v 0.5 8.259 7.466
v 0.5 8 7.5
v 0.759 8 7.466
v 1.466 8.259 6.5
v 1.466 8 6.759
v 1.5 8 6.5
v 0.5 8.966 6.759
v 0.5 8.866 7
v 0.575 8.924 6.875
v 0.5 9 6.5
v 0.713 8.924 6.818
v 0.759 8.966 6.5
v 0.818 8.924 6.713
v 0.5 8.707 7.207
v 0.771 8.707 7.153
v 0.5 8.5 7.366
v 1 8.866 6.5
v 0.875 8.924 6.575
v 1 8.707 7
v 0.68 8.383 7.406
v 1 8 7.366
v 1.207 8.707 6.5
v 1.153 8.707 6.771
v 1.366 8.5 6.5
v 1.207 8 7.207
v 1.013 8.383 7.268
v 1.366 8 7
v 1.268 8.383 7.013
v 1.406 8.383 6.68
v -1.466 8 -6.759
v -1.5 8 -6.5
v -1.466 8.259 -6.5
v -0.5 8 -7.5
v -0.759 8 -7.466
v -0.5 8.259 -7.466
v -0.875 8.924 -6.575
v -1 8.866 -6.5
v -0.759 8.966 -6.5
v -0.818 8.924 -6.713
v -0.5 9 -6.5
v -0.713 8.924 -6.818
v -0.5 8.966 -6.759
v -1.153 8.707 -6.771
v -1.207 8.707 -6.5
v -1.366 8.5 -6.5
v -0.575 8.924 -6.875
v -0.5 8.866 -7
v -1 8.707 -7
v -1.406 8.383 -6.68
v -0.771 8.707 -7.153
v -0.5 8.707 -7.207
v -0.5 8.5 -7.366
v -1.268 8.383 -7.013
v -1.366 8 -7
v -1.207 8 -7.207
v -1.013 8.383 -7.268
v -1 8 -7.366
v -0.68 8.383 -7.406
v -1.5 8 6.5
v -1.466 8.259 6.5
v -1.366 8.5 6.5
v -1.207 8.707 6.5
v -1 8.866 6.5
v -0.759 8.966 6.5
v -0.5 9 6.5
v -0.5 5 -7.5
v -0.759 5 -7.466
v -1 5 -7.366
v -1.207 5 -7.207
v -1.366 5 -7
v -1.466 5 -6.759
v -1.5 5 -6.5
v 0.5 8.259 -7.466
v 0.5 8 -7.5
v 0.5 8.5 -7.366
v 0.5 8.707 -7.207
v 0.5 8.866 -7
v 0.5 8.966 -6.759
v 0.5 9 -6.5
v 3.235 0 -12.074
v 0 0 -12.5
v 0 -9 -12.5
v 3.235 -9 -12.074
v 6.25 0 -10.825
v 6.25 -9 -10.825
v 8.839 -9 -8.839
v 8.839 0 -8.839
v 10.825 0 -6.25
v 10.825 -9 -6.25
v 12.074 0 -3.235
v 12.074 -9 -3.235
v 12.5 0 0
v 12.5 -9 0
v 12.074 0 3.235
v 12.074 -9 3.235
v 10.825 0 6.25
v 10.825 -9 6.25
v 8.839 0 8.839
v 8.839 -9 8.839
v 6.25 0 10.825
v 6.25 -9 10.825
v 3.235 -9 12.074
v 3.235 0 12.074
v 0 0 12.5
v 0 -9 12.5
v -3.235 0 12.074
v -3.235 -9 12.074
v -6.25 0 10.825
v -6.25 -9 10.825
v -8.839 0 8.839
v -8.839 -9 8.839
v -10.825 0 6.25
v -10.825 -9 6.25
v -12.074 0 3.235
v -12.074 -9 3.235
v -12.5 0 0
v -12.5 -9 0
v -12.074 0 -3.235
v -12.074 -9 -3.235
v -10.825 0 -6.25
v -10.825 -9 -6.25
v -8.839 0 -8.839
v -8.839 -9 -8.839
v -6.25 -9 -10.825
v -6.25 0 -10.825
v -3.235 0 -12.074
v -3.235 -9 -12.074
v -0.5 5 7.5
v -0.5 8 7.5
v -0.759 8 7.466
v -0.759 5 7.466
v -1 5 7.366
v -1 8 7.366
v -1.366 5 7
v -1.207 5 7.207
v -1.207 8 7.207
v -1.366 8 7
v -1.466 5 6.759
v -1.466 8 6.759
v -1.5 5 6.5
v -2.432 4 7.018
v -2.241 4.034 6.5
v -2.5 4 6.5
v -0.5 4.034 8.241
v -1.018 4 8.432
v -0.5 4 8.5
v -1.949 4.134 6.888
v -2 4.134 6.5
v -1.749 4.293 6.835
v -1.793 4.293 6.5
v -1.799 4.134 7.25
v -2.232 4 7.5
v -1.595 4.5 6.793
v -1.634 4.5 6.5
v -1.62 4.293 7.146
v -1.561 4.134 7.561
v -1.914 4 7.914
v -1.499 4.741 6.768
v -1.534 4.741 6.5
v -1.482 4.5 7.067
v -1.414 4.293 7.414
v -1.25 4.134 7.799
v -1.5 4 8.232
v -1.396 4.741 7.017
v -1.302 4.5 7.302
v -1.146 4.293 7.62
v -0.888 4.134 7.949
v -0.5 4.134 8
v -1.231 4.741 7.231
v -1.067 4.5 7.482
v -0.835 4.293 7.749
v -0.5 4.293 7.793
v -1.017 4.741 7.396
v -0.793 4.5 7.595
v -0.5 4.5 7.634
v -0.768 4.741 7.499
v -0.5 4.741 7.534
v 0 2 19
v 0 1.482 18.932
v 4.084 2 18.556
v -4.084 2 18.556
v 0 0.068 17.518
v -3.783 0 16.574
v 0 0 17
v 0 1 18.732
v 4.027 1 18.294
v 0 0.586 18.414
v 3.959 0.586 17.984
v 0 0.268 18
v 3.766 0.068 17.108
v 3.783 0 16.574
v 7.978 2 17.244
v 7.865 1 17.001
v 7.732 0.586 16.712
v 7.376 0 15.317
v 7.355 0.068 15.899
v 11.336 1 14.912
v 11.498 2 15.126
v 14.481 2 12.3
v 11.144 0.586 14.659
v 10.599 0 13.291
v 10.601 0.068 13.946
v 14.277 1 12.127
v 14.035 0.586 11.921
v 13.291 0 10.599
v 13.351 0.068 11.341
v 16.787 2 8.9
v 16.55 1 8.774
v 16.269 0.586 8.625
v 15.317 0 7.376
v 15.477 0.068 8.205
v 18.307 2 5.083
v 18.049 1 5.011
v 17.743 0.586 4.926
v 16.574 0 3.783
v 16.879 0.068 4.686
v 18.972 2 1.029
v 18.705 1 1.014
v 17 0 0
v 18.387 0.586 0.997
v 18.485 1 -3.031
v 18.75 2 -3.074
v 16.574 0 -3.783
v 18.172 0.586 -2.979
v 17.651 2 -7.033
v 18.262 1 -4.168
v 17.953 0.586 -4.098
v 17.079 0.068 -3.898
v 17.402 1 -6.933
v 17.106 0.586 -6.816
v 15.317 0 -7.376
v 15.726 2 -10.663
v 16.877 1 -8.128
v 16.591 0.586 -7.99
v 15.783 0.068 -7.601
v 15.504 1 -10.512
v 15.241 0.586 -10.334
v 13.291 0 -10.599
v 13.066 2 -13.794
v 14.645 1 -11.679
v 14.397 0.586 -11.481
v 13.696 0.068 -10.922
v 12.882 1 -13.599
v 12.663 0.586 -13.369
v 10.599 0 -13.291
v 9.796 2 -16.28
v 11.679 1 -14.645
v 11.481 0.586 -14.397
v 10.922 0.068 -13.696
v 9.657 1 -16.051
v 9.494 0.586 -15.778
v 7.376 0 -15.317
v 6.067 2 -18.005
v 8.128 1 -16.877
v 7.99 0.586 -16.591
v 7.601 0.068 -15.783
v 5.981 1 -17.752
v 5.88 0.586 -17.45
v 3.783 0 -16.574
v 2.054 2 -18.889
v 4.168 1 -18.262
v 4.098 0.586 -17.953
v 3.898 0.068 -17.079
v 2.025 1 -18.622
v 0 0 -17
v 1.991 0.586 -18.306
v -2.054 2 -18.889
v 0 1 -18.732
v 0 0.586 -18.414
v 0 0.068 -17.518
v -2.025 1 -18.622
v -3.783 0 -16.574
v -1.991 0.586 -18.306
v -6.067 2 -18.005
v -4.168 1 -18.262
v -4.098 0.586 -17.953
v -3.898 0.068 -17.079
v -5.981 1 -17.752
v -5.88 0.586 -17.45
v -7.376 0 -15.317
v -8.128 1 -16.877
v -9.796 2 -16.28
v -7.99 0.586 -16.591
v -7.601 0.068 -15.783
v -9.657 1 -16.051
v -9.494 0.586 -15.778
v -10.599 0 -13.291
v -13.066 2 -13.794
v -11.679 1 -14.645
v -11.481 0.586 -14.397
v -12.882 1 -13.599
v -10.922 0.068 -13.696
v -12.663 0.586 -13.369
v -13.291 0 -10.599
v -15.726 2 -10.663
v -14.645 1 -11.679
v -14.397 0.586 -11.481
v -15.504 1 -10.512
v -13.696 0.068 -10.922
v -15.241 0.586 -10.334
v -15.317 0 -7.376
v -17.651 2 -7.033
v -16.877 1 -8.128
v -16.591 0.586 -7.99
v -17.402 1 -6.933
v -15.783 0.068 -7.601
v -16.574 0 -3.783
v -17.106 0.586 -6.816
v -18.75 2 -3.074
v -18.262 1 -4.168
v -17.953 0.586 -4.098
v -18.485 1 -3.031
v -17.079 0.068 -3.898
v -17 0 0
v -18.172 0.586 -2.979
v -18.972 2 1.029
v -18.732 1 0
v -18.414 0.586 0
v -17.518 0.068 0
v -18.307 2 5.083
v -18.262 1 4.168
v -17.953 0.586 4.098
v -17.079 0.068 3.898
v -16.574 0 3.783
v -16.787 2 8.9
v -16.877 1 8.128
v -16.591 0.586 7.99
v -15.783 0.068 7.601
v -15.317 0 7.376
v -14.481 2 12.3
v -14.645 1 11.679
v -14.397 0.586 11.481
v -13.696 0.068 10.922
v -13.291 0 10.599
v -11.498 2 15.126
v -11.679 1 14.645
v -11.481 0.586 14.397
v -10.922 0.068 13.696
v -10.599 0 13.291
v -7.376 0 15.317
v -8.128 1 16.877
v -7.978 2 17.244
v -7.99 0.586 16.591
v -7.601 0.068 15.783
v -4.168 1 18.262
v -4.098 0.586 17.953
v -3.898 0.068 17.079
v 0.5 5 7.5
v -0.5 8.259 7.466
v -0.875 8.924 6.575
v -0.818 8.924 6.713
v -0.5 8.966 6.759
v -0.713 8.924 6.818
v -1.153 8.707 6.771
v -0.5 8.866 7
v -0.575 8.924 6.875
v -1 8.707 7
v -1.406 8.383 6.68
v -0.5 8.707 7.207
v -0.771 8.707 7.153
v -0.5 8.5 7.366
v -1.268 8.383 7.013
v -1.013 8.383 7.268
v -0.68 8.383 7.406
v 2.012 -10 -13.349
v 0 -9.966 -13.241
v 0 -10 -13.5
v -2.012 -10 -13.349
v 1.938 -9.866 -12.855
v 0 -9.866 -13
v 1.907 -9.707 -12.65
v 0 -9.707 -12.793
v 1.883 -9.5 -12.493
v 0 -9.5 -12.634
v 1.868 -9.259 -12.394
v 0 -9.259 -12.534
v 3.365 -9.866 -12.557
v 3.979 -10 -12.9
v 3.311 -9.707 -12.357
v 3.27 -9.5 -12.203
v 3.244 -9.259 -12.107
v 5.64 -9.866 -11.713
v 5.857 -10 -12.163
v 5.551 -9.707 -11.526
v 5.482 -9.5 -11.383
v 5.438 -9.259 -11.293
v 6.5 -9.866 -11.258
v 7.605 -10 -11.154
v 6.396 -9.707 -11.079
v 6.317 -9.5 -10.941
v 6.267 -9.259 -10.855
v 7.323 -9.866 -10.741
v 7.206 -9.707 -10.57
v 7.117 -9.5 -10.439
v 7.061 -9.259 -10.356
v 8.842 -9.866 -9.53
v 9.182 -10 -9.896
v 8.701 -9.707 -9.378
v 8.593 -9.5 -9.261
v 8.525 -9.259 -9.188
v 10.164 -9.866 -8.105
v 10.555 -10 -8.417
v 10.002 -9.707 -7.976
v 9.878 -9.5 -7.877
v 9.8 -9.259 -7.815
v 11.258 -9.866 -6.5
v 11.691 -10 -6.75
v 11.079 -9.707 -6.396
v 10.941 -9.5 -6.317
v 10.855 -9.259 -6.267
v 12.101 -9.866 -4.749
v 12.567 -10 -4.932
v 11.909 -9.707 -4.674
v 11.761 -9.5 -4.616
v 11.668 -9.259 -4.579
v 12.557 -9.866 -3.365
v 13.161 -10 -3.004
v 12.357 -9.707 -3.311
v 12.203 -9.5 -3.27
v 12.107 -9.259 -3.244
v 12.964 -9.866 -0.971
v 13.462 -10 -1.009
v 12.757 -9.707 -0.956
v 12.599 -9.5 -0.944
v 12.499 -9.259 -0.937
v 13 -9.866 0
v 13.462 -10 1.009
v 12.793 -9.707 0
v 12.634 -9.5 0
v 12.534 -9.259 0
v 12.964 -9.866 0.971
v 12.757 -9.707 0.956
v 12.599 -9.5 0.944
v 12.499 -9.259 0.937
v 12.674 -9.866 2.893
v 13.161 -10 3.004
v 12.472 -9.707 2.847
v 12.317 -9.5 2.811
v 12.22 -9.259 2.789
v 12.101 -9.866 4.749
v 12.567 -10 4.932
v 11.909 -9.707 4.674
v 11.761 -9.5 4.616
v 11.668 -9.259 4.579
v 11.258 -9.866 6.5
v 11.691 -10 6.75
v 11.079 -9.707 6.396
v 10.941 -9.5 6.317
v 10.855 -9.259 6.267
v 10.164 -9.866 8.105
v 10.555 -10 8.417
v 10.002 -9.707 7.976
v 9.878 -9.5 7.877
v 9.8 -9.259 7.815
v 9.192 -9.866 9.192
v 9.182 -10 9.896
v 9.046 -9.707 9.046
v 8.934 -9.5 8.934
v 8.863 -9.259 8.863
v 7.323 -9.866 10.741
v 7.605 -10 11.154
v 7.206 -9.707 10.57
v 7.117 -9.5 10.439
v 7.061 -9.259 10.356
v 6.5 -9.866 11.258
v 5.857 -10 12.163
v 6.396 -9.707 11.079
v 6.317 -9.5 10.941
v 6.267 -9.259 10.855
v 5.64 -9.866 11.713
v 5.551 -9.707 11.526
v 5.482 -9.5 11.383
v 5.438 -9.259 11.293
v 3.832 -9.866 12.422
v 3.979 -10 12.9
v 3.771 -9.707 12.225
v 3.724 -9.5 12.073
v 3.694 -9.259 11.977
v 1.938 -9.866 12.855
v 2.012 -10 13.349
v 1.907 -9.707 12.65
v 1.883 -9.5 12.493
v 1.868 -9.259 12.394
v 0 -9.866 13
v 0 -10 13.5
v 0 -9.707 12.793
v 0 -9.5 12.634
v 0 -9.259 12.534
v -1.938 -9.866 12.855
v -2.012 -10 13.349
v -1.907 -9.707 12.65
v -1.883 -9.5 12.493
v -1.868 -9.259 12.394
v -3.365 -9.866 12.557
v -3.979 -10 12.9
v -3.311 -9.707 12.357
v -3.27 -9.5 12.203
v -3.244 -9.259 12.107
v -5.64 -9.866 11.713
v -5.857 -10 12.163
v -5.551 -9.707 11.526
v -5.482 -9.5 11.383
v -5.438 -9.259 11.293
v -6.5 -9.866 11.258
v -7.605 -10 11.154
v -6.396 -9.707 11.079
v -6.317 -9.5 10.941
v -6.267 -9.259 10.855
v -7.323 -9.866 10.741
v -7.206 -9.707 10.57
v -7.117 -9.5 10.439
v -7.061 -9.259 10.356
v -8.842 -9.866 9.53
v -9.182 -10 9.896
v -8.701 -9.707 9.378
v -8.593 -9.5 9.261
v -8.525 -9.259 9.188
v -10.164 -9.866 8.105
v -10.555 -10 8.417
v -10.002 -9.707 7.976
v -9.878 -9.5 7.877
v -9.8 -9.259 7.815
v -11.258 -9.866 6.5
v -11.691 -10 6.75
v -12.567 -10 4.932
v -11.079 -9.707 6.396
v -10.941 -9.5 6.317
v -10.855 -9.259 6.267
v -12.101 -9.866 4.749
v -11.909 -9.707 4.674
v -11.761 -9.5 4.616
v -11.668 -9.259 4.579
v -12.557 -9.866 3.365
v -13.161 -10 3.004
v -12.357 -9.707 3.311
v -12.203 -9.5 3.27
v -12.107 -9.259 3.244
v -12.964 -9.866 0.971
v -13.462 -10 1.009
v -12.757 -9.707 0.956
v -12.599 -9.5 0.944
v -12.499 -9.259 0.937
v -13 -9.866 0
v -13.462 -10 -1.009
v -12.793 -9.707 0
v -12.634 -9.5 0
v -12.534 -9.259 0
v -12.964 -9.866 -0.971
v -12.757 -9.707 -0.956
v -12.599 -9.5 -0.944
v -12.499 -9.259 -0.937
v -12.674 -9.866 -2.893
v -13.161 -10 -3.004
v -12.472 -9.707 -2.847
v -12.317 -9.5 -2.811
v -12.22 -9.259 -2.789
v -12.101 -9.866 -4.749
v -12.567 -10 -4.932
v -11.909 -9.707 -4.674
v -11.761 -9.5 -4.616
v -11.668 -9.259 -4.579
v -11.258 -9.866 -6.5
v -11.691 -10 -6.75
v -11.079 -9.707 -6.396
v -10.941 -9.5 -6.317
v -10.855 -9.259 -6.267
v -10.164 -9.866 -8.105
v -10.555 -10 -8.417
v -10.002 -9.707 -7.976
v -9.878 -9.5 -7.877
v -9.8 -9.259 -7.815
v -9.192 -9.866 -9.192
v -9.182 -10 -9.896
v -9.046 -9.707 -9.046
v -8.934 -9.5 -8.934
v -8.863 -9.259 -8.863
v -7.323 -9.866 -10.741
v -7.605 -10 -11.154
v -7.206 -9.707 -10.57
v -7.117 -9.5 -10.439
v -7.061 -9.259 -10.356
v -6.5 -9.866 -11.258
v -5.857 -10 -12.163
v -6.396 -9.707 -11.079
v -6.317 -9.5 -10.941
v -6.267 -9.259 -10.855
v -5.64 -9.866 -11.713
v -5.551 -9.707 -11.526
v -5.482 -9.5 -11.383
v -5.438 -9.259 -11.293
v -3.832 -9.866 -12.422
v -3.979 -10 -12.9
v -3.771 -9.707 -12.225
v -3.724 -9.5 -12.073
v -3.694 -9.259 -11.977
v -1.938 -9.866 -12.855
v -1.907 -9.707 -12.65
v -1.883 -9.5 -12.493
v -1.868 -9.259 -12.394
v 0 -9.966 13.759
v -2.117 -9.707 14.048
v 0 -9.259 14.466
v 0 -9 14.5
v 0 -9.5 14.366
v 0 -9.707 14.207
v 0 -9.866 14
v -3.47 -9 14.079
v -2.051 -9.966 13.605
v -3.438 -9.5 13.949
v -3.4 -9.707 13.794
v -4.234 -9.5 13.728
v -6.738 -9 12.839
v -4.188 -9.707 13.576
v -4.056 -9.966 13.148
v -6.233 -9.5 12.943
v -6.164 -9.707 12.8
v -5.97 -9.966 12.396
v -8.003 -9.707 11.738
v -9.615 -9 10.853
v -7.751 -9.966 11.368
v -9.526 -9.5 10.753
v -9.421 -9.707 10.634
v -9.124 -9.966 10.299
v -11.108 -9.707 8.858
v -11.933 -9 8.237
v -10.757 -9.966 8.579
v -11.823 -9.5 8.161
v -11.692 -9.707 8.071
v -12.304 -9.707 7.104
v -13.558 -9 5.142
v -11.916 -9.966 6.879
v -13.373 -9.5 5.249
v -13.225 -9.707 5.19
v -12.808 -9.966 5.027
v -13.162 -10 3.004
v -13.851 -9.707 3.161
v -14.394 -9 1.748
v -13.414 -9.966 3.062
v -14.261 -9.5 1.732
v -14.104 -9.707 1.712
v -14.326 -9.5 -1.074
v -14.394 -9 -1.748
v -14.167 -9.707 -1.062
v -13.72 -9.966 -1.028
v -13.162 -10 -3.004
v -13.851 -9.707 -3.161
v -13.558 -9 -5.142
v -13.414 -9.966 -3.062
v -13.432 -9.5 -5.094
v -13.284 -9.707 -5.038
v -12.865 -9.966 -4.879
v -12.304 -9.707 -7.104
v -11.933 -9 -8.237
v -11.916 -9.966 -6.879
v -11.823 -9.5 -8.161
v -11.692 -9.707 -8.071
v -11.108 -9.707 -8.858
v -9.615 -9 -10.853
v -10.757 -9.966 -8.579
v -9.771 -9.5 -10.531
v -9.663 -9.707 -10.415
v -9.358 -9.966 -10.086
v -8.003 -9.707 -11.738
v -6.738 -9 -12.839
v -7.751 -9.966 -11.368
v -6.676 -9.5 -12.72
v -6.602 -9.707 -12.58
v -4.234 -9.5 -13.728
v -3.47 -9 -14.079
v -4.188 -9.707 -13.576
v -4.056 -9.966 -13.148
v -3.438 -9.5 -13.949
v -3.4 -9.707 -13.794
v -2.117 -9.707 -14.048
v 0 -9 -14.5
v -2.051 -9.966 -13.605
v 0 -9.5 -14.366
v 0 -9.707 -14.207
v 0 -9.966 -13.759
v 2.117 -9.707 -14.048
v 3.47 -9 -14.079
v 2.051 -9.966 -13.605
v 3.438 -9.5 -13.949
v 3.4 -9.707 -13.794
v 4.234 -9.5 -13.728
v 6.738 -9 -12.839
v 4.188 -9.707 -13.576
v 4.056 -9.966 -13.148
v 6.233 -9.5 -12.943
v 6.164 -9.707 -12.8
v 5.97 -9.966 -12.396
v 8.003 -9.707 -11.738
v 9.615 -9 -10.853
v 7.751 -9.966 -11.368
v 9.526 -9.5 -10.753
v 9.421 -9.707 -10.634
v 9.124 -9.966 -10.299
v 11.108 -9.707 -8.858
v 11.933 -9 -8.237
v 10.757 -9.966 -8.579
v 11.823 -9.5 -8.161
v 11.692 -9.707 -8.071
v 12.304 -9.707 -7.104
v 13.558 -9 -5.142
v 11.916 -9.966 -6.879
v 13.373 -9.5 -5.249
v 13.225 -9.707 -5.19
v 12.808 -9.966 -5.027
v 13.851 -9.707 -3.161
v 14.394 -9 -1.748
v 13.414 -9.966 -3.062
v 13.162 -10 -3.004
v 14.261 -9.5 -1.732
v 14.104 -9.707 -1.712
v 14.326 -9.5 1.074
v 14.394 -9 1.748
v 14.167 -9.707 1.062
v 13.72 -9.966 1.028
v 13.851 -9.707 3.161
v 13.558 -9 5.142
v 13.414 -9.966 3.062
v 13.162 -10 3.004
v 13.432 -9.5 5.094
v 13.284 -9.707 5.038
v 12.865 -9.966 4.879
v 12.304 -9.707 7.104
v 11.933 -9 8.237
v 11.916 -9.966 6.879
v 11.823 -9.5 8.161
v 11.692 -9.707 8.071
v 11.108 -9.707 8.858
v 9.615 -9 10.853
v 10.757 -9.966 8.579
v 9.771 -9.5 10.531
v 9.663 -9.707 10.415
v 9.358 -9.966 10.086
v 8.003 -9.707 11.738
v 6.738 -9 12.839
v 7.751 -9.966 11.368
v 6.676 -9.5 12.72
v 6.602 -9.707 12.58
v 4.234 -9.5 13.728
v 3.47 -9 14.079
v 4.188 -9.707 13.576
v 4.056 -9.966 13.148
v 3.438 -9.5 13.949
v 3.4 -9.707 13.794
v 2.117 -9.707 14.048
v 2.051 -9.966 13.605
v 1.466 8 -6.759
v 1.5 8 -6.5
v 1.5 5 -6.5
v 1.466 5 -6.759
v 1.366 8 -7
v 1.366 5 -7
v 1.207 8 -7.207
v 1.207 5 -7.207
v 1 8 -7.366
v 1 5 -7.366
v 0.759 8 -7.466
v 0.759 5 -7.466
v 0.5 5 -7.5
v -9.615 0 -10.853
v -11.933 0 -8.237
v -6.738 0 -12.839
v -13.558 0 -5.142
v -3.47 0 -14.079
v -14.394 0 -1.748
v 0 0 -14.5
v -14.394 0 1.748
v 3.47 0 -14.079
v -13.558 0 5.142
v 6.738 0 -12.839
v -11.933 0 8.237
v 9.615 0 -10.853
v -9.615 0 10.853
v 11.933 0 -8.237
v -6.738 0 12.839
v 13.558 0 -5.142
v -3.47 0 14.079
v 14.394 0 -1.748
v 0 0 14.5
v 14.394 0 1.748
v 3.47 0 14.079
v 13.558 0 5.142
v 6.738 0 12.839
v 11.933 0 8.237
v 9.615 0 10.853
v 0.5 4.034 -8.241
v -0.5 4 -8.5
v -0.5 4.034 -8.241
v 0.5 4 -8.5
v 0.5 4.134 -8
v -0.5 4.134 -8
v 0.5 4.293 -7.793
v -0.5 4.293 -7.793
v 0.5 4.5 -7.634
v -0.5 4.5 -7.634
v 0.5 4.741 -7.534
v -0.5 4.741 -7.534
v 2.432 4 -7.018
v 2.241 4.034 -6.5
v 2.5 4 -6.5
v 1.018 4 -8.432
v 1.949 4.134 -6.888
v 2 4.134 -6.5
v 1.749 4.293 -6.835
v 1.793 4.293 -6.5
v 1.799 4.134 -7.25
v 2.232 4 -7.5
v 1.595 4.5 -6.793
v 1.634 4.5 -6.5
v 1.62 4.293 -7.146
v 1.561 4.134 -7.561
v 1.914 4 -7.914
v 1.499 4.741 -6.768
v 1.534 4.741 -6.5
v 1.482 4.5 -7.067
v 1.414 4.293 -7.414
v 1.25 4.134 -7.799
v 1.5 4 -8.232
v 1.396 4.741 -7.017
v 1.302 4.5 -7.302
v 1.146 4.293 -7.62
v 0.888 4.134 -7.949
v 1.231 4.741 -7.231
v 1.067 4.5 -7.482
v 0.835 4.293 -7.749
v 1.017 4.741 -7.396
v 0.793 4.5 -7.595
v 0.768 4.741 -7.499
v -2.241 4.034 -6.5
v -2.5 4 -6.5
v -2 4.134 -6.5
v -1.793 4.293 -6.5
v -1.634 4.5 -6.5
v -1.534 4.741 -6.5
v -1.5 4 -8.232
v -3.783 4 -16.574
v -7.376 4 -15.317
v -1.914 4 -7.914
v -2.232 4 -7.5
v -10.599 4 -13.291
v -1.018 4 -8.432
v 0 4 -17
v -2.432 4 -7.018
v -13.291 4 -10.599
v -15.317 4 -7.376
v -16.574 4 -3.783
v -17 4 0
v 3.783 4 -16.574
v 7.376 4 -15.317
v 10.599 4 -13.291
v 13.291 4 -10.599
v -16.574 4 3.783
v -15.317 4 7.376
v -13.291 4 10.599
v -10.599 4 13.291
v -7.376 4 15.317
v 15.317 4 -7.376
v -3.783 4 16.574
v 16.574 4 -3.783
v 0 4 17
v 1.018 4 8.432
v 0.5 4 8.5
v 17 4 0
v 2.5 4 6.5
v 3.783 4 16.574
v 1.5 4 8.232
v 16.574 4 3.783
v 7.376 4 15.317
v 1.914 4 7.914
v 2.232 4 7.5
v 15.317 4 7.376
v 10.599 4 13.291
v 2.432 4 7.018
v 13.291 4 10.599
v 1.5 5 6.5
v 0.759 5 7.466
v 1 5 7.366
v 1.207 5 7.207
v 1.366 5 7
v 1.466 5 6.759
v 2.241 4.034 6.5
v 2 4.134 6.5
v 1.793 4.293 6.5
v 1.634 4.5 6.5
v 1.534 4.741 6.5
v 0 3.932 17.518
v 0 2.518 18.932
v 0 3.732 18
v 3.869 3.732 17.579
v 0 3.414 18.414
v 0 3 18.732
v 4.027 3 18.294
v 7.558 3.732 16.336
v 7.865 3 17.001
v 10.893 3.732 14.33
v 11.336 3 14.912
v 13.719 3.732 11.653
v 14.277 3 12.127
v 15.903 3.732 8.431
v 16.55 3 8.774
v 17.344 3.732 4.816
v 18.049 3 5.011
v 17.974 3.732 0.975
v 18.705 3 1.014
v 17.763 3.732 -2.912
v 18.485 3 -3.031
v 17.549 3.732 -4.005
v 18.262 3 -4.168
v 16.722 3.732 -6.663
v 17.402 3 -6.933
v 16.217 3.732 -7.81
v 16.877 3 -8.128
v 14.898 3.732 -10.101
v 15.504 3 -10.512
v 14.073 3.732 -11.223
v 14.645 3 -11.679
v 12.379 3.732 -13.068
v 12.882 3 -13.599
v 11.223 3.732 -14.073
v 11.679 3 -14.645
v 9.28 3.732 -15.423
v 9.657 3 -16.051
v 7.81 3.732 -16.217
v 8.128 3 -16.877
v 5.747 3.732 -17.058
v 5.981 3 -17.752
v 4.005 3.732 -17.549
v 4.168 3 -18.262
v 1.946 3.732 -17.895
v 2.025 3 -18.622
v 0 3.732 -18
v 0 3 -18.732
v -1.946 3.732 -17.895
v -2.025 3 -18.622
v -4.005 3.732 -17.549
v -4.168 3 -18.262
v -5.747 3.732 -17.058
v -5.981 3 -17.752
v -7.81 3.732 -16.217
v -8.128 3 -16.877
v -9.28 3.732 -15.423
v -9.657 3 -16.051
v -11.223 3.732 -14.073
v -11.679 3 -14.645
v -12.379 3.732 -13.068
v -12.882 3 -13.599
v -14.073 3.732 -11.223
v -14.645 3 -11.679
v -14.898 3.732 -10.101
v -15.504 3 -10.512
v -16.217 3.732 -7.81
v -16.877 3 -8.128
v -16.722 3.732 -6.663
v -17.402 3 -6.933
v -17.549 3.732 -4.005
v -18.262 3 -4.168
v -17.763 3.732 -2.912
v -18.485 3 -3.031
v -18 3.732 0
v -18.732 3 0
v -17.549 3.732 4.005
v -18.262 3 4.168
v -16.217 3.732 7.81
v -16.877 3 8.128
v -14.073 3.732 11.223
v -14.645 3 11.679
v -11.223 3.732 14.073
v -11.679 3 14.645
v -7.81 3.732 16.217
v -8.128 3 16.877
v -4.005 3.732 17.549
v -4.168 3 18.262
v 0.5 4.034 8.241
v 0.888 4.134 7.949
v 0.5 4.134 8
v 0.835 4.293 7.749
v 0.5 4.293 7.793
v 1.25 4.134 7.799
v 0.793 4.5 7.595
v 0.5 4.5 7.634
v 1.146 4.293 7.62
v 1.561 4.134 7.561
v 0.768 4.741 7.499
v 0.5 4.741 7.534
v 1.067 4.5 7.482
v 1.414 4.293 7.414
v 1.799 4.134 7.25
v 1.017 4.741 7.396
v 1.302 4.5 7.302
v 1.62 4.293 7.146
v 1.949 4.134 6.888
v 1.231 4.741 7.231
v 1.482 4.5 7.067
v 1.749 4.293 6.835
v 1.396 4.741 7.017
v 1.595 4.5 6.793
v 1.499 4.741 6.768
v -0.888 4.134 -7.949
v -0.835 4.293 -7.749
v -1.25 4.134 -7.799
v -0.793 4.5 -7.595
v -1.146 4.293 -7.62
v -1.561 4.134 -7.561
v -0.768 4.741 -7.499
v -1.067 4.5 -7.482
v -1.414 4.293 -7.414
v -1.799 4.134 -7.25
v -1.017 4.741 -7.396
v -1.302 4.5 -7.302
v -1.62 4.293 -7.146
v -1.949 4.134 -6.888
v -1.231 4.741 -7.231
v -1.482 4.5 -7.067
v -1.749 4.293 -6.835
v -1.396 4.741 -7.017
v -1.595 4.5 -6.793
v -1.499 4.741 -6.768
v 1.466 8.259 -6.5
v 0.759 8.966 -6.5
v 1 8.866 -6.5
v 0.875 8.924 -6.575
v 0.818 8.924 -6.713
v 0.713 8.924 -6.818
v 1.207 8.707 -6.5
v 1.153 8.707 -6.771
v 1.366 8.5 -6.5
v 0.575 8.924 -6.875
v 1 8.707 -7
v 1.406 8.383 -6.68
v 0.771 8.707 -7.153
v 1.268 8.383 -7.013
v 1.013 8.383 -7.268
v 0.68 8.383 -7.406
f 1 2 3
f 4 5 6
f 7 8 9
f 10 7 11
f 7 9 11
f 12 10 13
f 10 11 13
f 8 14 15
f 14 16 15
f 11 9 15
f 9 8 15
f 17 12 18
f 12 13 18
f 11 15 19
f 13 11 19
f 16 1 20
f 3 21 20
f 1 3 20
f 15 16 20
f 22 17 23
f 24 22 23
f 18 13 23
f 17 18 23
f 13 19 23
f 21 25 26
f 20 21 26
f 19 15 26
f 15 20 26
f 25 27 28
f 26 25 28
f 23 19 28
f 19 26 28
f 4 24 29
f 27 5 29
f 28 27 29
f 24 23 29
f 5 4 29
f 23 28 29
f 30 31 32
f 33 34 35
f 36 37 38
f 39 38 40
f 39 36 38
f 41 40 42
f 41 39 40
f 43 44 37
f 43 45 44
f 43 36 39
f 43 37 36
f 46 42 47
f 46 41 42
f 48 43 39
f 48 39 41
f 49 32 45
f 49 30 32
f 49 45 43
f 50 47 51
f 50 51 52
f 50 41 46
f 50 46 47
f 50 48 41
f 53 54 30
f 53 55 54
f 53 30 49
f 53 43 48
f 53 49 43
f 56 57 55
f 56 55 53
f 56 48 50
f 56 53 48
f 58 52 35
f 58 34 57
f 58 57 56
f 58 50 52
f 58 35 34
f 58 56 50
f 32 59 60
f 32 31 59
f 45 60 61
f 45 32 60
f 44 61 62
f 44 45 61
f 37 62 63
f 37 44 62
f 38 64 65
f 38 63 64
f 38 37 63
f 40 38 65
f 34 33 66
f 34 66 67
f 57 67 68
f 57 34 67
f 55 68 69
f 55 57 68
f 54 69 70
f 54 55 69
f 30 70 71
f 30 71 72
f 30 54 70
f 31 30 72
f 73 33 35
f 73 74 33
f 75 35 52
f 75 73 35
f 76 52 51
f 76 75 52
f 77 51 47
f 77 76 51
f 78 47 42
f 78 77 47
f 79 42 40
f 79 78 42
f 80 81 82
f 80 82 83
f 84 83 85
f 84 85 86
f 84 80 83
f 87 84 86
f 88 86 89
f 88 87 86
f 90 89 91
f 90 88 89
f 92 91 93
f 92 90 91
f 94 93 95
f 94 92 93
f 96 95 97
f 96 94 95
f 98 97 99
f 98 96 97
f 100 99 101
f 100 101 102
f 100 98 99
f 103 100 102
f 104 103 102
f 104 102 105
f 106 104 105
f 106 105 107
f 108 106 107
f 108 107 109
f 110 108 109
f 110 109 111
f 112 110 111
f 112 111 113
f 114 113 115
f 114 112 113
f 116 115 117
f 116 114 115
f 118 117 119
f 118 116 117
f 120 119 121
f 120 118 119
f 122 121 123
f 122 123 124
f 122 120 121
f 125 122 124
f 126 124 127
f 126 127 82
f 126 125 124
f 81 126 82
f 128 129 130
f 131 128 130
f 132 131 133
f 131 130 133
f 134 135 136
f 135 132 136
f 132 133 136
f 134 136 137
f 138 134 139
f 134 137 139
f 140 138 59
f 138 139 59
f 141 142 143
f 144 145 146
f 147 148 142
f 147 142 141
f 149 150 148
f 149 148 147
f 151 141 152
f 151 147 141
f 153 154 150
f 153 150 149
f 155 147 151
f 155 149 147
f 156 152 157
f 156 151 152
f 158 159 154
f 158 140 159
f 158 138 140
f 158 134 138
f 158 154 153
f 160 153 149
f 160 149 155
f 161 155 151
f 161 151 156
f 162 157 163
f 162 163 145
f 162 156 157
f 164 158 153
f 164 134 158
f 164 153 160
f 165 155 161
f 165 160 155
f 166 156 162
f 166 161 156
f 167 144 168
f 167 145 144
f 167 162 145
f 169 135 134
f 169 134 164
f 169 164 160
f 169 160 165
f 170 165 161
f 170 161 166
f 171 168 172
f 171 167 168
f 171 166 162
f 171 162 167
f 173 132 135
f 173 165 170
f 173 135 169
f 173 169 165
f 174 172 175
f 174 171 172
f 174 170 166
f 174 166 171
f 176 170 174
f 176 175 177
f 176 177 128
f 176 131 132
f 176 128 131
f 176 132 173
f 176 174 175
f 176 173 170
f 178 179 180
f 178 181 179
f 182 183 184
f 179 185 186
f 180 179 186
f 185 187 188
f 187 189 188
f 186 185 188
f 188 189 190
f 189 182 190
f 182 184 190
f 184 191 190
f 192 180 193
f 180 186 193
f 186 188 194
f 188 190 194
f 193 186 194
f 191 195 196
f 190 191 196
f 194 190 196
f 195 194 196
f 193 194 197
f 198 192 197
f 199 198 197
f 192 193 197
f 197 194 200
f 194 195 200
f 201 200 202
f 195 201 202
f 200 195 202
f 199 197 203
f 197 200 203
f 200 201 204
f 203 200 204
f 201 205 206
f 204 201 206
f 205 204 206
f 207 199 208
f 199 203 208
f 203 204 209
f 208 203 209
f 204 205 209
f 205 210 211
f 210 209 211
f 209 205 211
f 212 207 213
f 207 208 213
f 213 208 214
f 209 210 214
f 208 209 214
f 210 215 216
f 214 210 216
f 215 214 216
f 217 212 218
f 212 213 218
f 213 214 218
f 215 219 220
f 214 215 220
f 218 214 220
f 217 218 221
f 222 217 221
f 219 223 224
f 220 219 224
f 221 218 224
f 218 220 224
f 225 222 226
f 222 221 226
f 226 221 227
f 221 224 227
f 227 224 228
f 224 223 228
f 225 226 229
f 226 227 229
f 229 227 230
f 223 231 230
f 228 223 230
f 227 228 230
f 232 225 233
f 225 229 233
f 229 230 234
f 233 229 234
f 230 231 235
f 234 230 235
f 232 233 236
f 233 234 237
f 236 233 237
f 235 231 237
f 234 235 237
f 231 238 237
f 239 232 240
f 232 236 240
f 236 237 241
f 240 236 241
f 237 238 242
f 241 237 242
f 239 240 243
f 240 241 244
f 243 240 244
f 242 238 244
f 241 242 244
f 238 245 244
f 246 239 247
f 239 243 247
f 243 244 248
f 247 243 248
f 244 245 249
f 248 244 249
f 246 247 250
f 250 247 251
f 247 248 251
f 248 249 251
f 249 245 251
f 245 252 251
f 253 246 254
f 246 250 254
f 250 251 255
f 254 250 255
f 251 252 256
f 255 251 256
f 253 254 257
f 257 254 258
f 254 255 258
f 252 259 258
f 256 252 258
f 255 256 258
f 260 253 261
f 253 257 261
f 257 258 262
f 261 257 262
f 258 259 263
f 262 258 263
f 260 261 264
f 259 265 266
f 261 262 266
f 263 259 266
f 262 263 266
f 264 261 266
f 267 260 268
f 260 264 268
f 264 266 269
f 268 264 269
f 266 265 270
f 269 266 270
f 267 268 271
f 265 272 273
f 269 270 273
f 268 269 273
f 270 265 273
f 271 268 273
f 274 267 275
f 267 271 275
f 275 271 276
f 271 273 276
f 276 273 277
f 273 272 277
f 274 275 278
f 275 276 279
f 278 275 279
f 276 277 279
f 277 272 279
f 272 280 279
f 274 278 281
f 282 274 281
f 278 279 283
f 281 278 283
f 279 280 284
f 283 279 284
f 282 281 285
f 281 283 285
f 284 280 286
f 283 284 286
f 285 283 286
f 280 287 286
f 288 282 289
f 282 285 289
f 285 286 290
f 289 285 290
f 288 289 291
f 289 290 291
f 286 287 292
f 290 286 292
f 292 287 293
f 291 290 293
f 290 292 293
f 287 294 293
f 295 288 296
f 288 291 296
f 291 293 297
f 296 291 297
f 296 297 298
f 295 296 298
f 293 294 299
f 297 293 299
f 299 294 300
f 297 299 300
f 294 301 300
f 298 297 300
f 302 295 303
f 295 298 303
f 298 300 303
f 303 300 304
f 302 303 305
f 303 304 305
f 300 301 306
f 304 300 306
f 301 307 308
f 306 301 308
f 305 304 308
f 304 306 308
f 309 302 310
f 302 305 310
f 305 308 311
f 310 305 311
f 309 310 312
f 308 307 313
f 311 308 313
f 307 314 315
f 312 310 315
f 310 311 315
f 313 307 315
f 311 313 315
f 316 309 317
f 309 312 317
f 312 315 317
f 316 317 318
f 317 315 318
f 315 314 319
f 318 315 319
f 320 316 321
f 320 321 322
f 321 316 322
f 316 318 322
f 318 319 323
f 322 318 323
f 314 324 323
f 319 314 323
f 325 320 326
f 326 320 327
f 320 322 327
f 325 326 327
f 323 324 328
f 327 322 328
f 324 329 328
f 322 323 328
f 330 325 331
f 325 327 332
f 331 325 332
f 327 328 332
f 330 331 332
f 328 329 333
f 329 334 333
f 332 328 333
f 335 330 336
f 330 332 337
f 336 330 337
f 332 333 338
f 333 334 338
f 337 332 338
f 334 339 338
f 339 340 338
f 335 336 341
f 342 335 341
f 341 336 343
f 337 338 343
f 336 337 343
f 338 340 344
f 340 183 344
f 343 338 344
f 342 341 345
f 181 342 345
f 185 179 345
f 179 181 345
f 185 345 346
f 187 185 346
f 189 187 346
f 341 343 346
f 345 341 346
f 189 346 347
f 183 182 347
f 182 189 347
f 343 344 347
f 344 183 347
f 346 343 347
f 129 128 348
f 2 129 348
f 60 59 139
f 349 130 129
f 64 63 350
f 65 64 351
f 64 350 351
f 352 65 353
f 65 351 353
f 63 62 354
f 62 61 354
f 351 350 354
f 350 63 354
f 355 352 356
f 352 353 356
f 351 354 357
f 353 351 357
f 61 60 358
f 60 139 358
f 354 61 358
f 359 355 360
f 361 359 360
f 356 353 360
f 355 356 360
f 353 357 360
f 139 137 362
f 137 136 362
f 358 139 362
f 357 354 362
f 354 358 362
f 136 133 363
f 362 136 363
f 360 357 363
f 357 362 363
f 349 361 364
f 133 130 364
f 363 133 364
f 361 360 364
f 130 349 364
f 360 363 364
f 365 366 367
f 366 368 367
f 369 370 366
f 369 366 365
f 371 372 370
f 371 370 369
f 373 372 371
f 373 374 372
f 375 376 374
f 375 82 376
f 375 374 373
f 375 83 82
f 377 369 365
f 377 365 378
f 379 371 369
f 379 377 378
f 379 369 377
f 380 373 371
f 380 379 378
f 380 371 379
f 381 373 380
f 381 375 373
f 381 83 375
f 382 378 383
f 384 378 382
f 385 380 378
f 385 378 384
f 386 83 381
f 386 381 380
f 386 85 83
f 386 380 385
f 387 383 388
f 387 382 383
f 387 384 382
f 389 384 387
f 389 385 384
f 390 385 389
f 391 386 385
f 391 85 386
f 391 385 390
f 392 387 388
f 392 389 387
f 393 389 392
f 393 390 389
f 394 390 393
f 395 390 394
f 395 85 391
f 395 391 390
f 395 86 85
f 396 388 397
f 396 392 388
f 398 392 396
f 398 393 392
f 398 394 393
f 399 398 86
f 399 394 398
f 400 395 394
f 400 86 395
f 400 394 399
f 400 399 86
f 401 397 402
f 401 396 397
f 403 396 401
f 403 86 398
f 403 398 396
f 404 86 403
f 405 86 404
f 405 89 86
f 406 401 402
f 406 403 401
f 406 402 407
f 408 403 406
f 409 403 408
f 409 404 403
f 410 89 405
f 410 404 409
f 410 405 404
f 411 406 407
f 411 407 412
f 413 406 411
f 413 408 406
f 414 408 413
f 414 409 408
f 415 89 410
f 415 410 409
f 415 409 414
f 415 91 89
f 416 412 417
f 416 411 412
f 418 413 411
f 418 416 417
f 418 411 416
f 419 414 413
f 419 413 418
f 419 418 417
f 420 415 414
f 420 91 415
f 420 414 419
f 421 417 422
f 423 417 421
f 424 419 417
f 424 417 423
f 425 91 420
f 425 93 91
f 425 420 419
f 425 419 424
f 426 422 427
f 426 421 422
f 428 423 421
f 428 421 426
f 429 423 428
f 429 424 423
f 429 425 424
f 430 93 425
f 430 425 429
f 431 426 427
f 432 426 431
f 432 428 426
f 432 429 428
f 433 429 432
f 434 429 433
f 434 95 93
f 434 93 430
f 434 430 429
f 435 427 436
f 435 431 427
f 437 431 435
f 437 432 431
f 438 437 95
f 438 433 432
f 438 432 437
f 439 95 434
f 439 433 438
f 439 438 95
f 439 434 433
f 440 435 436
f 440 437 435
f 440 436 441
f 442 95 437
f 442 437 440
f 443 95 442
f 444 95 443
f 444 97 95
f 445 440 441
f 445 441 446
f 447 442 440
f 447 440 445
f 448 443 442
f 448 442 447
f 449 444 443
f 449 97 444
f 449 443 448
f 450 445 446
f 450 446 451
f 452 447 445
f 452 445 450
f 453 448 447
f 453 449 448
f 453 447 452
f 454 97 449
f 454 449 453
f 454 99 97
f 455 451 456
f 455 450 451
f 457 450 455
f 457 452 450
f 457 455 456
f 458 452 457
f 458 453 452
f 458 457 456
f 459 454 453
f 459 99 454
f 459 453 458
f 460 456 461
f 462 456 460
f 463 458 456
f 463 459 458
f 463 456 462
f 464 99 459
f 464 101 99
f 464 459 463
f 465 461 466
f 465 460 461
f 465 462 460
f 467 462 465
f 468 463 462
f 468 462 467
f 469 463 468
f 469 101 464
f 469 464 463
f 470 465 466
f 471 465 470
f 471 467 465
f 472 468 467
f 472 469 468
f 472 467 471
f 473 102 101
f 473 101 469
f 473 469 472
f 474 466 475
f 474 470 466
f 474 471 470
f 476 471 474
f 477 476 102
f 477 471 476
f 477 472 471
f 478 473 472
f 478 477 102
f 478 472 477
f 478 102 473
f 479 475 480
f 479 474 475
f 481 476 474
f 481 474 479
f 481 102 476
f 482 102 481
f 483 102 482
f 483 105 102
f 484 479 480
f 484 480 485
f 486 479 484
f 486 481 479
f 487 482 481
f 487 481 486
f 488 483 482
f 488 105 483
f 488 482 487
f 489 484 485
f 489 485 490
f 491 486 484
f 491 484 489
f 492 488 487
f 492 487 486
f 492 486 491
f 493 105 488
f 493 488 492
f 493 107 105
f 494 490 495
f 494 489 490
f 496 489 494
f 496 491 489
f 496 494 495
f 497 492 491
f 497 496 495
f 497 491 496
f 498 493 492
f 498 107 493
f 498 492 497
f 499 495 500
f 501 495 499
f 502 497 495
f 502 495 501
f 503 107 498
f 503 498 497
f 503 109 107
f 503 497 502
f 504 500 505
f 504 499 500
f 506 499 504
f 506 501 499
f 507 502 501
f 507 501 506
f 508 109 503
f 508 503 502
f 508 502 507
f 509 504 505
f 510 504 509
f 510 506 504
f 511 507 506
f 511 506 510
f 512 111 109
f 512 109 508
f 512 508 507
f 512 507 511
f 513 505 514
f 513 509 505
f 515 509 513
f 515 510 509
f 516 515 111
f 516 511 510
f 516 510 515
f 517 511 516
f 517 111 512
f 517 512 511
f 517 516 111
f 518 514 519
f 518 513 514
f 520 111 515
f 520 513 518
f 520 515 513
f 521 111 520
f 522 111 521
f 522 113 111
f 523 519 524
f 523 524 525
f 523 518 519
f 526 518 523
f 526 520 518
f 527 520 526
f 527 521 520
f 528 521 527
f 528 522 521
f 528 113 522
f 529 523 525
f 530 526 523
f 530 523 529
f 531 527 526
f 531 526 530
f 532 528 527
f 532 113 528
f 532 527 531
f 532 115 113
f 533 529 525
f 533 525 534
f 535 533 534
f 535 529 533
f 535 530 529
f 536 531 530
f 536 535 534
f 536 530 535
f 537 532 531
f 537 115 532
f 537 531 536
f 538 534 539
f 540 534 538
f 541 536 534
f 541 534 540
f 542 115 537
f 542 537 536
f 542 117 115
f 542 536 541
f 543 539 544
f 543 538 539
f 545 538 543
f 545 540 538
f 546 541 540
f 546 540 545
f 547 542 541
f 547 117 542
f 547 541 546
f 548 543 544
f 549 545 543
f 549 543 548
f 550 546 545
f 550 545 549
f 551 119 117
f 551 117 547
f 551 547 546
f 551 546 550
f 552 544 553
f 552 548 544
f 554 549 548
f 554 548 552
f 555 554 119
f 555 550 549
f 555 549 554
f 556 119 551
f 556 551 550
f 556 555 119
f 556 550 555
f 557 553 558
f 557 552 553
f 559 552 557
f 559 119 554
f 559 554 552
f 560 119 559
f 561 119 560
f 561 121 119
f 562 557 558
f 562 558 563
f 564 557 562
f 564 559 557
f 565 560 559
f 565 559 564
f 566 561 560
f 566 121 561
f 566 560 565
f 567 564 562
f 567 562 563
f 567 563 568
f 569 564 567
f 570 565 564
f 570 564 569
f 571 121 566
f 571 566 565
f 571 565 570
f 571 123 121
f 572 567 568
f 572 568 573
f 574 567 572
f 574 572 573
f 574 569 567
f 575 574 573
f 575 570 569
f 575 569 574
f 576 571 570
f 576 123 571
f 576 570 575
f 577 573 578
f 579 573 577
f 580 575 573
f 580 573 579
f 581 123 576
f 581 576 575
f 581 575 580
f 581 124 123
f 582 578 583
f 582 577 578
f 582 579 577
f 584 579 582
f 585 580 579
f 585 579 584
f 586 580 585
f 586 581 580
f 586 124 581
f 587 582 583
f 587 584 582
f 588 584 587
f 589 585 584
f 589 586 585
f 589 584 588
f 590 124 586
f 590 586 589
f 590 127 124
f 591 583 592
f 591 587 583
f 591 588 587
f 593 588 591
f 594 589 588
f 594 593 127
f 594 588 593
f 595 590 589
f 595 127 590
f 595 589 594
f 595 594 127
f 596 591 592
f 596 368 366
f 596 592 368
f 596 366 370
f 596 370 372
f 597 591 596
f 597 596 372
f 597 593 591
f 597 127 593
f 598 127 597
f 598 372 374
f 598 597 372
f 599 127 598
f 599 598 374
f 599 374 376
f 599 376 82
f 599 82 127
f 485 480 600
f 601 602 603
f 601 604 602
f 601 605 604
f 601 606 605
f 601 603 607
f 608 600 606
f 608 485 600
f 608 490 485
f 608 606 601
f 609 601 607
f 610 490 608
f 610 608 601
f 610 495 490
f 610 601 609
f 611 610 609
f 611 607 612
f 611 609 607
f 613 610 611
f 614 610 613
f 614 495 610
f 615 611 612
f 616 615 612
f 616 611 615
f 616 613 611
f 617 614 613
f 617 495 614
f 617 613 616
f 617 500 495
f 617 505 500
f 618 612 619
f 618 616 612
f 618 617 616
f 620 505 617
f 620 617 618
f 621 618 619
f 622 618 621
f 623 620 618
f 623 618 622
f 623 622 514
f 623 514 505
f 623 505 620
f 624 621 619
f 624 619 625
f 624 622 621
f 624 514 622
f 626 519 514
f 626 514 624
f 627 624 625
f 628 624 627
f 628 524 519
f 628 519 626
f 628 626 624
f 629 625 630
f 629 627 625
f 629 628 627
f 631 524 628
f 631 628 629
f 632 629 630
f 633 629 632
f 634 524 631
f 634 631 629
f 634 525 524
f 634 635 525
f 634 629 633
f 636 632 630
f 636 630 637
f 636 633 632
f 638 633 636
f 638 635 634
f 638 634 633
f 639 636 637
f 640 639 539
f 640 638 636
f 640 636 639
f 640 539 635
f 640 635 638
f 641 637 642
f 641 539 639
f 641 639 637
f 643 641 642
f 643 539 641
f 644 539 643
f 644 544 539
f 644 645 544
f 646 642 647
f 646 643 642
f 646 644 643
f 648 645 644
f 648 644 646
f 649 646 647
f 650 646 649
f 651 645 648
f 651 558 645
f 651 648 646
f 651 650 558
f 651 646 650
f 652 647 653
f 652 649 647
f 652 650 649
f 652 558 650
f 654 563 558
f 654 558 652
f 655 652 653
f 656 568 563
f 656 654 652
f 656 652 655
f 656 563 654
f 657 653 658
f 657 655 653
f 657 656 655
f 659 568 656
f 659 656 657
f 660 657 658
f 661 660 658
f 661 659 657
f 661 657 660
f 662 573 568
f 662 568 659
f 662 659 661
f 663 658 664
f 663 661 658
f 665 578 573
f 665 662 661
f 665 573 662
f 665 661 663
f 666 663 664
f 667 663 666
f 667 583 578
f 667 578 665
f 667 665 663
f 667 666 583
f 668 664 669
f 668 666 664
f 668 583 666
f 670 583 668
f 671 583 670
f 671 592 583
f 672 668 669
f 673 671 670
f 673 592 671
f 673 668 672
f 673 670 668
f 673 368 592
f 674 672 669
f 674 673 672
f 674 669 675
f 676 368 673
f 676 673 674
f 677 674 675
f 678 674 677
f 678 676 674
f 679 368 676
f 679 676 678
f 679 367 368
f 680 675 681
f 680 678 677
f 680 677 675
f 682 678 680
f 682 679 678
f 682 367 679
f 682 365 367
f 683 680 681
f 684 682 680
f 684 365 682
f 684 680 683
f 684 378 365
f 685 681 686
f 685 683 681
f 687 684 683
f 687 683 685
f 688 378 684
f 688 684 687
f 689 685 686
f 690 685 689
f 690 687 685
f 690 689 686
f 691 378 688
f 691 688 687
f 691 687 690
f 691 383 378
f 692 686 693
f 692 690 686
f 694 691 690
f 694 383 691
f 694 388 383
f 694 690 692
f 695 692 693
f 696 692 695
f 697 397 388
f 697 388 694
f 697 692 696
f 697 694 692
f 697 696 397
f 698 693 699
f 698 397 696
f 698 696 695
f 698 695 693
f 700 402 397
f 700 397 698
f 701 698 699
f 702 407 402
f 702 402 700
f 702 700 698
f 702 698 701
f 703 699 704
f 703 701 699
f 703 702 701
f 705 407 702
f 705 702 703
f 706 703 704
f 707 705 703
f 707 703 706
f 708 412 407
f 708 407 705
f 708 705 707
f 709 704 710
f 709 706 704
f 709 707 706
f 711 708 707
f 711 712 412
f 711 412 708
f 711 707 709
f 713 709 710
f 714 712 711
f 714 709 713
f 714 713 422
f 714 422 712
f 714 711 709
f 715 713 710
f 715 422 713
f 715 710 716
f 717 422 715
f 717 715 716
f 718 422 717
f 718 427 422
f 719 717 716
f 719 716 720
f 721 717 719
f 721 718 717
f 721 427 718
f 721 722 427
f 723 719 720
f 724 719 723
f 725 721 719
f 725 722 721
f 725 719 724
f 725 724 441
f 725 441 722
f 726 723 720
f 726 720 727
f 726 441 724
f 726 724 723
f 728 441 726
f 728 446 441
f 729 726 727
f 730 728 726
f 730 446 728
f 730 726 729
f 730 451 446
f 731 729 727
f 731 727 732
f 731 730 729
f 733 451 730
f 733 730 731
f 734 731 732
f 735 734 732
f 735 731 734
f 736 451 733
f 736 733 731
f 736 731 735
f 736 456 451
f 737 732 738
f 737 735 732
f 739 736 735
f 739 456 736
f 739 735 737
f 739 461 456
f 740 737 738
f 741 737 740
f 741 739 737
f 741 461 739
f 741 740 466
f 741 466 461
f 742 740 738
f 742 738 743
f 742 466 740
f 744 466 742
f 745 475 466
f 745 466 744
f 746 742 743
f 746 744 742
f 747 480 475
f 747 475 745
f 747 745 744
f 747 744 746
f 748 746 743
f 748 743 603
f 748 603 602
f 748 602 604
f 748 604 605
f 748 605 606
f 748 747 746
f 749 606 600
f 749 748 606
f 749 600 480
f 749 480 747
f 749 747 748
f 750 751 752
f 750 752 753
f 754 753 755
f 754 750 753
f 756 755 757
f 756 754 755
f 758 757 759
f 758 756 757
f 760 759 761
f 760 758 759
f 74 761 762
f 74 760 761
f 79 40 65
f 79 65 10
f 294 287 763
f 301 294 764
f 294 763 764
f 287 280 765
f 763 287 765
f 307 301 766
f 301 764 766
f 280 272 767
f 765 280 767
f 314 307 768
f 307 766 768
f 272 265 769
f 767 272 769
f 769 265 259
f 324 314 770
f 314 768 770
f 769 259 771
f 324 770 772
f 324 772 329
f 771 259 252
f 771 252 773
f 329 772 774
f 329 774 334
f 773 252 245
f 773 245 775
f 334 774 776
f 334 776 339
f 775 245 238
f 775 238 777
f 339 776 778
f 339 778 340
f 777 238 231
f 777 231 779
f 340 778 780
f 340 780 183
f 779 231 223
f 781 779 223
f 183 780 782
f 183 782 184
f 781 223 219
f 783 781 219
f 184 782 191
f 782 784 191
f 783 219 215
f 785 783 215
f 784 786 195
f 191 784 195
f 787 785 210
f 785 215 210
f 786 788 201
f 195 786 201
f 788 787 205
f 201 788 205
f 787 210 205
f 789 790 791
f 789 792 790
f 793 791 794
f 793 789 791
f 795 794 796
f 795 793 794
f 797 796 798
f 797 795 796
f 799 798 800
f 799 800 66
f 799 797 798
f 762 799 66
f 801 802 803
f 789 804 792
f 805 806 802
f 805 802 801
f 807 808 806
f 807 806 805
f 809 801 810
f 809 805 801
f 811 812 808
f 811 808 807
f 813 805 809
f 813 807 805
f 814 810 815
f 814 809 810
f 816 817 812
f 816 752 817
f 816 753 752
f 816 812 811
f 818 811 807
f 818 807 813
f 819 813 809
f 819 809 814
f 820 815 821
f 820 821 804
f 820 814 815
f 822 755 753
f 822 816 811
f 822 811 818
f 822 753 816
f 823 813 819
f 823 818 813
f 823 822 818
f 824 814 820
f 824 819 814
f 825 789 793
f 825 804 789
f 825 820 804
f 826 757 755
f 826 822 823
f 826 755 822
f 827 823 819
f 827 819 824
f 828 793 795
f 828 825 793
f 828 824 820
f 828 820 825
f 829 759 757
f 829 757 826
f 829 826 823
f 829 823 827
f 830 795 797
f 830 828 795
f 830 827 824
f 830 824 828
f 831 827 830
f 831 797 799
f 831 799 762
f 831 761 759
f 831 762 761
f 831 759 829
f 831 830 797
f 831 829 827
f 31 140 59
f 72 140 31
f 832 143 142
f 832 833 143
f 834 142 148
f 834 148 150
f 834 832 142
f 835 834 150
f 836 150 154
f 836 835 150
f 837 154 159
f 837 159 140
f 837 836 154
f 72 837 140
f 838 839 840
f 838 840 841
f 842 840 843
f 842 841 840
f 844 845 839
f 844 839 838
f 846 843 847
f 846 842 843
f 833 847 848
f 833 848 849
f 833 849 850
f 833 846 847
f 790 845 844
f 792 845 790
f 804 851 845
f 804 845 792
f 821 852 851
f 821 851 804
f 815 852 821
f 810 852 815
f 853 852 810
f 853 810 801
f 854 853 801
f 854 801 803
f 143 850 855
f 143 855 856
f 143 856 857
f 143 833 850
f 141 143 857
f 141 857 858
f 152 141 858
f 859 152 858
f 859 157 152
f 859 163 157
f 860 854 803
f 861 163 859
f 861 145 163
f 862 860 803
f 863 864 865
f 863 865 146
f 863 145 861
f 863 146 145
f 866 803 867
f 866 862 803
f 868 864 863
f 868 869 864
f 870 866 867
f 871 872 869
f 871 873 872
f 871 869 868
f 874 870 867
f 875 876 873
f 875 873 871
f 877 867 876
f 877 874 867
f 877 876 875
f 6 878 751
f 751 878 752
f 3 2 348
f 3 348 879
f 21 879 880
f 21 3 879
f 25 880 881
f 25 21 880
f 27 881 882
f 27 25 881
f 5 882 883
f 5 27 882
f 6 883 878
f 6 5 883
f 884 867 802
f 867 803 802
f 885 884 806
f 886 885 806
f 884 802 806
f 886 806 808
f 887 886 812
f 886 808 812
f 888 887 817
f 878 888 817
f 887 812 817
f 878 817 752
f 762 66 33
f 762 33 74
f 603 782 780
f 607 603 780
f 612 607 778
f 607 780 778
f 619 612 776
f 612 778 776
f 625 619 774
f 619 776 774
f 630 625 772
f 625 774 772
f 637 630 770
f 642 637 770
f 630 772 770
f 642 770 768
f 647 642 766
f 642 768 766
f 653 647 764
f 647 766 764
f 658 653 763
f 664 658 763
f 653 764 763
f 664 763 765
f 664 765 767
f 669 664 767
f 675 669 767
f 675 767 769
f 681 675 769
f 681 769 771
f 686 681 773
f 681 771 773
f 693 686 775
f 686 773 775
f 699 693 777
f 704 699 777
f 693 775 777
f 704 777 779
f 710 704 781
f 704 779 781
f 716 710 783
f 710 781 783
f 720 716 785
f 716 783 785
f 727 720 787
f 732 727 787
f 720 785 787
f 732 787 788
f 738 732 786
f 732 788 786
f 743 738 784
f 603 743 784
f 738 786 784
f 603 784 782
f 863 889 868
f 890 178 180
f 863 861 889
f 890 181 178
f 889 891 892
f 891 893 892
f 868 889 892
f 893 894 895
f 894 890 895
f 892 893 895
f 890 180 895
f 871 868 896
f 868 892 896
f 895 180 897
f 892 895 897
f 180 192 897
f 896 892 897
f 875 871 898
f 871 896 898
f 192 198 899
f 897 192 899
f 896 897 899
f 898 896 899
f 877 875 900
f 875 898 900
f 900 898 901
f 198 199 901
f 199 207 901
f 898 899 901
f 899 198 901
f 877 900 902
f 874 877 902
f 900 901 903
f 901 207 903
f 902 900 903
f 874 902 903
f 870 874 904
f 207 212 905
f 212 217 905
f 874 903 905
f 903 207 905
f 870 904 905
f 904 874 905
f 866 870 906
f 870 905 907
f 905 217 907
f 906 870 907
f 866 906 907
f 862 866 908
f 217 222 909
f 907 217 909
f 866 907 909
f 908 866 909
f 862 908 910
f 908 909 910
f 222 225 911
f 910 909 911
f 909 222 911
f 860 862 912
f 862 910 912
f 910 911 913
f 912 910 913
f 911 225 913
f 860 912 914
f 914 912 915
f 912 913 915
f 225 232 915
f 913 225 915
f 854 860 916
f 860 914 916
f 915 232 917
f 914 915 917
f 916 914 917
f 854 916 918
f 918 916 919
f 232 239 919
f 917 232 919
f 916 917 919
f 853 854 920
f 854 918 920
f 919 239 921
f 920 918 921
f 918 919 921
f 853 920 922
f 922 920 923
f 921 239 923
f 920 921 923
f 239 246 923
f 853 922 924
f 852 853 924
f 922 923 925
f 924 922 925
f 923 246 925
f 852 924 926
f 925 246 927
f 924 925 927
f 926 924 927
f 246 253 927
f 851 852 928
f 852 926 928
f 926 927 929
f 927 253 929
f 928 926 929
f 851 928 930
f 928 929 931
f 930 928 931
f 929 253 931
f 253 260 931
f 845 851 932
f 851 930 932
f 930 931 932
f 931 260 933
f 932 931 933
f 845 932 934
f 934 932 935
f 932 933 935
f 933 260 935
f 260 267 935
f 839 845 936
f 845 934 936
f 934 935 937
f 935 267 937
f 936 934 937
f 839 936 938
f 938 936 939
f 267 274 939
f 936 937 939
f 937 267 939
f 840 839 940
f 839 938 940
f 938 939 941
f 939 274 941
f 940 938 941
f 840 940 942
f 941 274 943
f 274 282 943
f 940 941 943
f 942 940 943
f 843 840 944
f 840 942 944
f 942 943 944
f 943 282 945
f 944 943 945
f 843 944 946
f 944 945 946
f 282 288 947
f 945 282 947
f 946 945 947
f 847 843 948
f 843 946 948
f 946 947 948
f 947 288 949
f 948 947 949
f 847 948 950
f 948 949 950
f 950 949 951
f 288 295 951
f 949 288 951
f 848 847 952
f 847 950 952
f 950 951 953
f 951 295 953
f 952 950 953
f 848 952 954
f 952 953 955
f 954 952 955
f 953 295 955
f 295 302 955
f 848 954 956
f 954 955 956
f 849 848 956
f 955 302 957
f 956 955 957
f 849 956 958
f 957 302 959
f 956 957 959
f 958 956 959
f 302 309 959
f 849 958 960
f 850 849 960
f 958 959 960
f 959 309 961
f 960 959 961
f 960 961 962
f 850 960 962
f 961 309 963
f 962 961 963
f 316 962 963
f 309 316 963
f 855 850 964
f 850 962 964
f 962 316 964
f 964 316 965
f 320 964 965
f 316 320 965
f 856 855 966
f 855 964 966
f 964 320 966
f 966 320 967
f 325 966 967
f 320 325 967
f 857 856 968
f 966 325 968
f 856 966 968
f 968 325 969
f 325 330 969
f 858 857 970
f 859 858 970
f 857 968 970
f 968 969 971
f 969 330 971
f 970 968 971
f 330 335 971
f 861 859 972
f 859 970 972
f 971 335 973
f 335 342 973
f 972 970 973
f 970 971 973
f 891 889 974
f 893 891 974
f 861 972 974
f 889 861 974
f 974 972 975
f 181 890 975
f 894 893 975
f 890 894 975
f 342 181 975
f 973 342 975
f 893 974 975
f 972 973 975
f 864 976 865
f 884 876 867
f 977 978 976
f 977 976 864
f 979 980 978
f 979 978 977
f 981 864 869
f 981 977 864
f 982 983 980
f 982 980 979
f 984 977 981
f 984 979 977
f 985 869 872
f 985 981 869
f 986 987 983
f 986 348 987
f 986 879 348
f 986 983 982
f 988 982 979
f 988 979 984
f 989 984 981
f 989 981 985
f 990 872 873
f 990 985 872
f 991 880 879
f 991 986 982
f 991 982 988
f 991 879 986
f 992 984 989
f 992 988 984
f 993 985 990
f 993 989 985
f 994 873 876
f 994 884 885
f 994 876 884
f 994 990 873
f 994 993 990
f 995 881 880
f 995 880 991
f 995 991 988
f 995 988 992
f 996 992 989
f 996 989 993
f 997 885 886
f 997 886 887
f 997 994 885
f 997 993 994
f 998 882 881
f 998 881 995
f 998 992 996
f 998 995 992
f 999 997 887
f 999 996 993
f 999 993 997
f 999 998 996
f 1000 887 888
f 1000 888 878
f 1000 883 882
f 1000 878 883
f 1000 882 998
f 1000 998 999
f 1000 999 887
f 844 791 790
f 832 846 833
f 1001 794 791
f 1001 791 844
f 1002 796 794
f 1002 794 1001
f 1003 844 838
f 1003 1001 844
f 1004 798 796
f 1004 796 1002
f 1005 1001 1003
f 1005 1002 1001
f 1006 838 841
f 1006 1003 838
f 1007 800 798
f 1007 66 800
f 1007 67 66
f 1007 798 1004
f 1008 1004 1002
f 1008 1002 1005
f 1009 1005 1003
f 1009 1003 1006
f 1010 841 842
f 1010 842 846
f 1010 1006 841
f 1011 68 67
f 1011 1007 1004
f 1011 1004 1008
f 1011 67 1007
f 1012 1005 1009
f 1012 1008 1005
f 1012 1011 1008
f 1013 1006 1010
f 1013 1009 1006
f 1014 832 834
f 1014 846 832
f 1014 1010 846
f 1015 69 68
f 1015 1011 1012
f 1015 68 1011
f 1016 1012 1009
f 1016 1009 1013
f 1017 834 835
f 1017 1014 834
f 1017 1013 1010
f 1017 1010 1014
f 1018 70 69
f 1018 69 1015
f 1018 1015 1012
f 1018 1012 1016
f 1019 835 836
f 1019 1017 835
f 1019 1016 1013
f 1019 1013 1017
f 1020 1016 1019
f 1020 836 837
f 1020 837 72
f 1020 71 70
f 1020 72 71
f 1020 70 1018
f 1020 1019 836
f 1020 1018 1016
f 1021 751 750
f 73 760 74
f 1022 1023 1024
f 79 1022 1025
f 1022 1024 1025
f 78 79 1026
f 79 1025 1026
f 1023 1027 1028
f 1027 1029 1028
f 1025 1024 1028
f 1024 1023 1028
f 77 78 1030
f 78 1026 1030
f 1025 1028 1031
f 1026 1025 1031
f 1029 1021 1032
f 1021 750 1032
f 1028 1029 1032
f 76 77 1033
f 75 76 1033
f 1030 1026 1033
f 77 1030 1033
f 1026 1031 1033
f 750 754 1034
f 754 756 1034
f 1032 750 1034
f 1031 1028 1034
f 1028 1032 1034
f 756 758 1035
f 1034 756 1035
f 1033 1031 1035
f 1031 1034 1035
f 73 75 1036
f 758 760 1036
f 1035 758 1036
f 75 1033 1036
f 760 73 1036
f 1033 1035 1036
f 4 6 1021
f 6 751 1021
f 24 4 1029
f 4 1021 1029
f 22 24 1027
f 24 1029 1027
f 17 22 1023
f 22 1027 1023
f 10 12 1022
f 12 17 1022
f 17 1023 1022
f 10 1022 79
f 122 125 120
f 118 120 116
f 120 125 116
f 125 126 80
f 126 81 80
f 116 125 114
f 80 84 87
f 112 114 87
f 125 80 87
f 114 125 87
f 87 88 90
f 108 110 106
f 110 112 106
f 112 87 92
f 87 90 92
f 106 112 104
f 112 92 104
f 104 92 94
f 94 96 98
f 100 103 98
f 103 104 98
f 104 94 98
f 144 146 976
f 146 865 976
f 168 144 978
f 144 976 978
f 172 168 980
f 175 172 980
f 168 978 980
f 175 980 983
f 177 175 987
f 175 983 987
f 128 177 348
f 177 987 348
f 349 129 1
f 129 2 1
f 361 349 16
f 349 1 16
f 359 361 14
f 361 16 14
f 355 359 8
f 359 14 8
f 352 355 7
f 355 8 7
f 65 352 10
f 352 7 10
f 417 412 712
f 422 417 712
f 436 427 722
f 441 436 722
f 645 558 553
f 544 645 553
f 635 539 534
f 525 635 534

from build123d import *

# Parameters (mm, degrees)
SKETCH_1_R      = 19
EXTRUDE_1_DEPTH = 4
SKETCH_2_W      = 3
SKETCH_2_H      = 15
EXTRUDE_2_DEPTH = 5
FILLET_1_R      = 1
FILLET_3_R      = 2
SKETCH_3_R      = 14.5
SKETCH_3_R_2    = 12.5
EXTRUDE_3_DEPTH = 10
FILLET_4_R      = 1


with BuildPart() as part:
    # 草圖1 → 填料-伸長1 (new body)
    with BuildSketch(Plane(origin=(0, 0, 0), x_dir=(1, 0, 0), z_dir=(0, 1, 0))):
        with Locations(Location((0, 0, 0), (0, 0, 270))):
            Circle(SKETCH_1_R)
    extrude(amount=EXTRUDE_1_DEPTH)

    # 草圖2 → 填料-伸長2 (add)
    with BuildSketch(Plane(origin=(0, 4, 0), x_dir=(1, 0, 0), z_dir=(0, 1, 0))):
        Rectangle(SKETCH_2_W, SKETCH_2_H)
    extrude(amount=EXTRUDE_2_DEPTH)

    # 圓角1
    fillet_1_edges = [part.edges().sort_by_distance(p)[0] for p in [
        (-1.5, 4, 0),
        (-1.5, 6.5, -7.5),
        (0, 4, 7.5),
        (-1.5, 6.5, 7.5),
        (1.5, 4, 0),
        (1.5, 6.5, 7.5),
        (0, 4, -7.5),
        (1.5, 6.5, -7.5),
        (-1.5, 9, 0),
        (0, 9, 7.5),
        (1.5, 9, 0),
        (0, 9, -7.5),
    ]]
    fillet(fillet_1_edges, radius=FILLET_1_R)

    # 圓角3
    fillet_3_edges = [part.edges().sort_by_distance(p)[0] for p in [
        (0, 0, -19),
        (0, 4, -19),
    ]]
    fillet(fillet_3_edges, radius=FILLET_3_R - 0.0001)  # a hair under: the kernel refuses the full size

    # 草圖3 → 填料-伸長3 (add)
    with BuildSketch(Plane.XZ):
        with Locations(Location((0, 0, 0), (0, 0, 90))):
            Circle(SKETCH_3_R)
        with Locations(Location((0, 0, 0), (0, 0, 270))):
            Circle(SKETCH_3_R_2, mode=Mode.SUBTRACT)
    extrude(amount=EXTRUDE_3_DEPTH)

    # 圓角4
    fillet_4_edges = [part.edges().sort_by_distance(p)[0] for p in [
        (0, -10, -14.5),
        (0, -10, 12.5),
    ]]
    fillet(fillet_4_edges, radius=FILLET_4_R - 0.0001)  # a hair under: the kernel refuses the full size


solid = part.part
